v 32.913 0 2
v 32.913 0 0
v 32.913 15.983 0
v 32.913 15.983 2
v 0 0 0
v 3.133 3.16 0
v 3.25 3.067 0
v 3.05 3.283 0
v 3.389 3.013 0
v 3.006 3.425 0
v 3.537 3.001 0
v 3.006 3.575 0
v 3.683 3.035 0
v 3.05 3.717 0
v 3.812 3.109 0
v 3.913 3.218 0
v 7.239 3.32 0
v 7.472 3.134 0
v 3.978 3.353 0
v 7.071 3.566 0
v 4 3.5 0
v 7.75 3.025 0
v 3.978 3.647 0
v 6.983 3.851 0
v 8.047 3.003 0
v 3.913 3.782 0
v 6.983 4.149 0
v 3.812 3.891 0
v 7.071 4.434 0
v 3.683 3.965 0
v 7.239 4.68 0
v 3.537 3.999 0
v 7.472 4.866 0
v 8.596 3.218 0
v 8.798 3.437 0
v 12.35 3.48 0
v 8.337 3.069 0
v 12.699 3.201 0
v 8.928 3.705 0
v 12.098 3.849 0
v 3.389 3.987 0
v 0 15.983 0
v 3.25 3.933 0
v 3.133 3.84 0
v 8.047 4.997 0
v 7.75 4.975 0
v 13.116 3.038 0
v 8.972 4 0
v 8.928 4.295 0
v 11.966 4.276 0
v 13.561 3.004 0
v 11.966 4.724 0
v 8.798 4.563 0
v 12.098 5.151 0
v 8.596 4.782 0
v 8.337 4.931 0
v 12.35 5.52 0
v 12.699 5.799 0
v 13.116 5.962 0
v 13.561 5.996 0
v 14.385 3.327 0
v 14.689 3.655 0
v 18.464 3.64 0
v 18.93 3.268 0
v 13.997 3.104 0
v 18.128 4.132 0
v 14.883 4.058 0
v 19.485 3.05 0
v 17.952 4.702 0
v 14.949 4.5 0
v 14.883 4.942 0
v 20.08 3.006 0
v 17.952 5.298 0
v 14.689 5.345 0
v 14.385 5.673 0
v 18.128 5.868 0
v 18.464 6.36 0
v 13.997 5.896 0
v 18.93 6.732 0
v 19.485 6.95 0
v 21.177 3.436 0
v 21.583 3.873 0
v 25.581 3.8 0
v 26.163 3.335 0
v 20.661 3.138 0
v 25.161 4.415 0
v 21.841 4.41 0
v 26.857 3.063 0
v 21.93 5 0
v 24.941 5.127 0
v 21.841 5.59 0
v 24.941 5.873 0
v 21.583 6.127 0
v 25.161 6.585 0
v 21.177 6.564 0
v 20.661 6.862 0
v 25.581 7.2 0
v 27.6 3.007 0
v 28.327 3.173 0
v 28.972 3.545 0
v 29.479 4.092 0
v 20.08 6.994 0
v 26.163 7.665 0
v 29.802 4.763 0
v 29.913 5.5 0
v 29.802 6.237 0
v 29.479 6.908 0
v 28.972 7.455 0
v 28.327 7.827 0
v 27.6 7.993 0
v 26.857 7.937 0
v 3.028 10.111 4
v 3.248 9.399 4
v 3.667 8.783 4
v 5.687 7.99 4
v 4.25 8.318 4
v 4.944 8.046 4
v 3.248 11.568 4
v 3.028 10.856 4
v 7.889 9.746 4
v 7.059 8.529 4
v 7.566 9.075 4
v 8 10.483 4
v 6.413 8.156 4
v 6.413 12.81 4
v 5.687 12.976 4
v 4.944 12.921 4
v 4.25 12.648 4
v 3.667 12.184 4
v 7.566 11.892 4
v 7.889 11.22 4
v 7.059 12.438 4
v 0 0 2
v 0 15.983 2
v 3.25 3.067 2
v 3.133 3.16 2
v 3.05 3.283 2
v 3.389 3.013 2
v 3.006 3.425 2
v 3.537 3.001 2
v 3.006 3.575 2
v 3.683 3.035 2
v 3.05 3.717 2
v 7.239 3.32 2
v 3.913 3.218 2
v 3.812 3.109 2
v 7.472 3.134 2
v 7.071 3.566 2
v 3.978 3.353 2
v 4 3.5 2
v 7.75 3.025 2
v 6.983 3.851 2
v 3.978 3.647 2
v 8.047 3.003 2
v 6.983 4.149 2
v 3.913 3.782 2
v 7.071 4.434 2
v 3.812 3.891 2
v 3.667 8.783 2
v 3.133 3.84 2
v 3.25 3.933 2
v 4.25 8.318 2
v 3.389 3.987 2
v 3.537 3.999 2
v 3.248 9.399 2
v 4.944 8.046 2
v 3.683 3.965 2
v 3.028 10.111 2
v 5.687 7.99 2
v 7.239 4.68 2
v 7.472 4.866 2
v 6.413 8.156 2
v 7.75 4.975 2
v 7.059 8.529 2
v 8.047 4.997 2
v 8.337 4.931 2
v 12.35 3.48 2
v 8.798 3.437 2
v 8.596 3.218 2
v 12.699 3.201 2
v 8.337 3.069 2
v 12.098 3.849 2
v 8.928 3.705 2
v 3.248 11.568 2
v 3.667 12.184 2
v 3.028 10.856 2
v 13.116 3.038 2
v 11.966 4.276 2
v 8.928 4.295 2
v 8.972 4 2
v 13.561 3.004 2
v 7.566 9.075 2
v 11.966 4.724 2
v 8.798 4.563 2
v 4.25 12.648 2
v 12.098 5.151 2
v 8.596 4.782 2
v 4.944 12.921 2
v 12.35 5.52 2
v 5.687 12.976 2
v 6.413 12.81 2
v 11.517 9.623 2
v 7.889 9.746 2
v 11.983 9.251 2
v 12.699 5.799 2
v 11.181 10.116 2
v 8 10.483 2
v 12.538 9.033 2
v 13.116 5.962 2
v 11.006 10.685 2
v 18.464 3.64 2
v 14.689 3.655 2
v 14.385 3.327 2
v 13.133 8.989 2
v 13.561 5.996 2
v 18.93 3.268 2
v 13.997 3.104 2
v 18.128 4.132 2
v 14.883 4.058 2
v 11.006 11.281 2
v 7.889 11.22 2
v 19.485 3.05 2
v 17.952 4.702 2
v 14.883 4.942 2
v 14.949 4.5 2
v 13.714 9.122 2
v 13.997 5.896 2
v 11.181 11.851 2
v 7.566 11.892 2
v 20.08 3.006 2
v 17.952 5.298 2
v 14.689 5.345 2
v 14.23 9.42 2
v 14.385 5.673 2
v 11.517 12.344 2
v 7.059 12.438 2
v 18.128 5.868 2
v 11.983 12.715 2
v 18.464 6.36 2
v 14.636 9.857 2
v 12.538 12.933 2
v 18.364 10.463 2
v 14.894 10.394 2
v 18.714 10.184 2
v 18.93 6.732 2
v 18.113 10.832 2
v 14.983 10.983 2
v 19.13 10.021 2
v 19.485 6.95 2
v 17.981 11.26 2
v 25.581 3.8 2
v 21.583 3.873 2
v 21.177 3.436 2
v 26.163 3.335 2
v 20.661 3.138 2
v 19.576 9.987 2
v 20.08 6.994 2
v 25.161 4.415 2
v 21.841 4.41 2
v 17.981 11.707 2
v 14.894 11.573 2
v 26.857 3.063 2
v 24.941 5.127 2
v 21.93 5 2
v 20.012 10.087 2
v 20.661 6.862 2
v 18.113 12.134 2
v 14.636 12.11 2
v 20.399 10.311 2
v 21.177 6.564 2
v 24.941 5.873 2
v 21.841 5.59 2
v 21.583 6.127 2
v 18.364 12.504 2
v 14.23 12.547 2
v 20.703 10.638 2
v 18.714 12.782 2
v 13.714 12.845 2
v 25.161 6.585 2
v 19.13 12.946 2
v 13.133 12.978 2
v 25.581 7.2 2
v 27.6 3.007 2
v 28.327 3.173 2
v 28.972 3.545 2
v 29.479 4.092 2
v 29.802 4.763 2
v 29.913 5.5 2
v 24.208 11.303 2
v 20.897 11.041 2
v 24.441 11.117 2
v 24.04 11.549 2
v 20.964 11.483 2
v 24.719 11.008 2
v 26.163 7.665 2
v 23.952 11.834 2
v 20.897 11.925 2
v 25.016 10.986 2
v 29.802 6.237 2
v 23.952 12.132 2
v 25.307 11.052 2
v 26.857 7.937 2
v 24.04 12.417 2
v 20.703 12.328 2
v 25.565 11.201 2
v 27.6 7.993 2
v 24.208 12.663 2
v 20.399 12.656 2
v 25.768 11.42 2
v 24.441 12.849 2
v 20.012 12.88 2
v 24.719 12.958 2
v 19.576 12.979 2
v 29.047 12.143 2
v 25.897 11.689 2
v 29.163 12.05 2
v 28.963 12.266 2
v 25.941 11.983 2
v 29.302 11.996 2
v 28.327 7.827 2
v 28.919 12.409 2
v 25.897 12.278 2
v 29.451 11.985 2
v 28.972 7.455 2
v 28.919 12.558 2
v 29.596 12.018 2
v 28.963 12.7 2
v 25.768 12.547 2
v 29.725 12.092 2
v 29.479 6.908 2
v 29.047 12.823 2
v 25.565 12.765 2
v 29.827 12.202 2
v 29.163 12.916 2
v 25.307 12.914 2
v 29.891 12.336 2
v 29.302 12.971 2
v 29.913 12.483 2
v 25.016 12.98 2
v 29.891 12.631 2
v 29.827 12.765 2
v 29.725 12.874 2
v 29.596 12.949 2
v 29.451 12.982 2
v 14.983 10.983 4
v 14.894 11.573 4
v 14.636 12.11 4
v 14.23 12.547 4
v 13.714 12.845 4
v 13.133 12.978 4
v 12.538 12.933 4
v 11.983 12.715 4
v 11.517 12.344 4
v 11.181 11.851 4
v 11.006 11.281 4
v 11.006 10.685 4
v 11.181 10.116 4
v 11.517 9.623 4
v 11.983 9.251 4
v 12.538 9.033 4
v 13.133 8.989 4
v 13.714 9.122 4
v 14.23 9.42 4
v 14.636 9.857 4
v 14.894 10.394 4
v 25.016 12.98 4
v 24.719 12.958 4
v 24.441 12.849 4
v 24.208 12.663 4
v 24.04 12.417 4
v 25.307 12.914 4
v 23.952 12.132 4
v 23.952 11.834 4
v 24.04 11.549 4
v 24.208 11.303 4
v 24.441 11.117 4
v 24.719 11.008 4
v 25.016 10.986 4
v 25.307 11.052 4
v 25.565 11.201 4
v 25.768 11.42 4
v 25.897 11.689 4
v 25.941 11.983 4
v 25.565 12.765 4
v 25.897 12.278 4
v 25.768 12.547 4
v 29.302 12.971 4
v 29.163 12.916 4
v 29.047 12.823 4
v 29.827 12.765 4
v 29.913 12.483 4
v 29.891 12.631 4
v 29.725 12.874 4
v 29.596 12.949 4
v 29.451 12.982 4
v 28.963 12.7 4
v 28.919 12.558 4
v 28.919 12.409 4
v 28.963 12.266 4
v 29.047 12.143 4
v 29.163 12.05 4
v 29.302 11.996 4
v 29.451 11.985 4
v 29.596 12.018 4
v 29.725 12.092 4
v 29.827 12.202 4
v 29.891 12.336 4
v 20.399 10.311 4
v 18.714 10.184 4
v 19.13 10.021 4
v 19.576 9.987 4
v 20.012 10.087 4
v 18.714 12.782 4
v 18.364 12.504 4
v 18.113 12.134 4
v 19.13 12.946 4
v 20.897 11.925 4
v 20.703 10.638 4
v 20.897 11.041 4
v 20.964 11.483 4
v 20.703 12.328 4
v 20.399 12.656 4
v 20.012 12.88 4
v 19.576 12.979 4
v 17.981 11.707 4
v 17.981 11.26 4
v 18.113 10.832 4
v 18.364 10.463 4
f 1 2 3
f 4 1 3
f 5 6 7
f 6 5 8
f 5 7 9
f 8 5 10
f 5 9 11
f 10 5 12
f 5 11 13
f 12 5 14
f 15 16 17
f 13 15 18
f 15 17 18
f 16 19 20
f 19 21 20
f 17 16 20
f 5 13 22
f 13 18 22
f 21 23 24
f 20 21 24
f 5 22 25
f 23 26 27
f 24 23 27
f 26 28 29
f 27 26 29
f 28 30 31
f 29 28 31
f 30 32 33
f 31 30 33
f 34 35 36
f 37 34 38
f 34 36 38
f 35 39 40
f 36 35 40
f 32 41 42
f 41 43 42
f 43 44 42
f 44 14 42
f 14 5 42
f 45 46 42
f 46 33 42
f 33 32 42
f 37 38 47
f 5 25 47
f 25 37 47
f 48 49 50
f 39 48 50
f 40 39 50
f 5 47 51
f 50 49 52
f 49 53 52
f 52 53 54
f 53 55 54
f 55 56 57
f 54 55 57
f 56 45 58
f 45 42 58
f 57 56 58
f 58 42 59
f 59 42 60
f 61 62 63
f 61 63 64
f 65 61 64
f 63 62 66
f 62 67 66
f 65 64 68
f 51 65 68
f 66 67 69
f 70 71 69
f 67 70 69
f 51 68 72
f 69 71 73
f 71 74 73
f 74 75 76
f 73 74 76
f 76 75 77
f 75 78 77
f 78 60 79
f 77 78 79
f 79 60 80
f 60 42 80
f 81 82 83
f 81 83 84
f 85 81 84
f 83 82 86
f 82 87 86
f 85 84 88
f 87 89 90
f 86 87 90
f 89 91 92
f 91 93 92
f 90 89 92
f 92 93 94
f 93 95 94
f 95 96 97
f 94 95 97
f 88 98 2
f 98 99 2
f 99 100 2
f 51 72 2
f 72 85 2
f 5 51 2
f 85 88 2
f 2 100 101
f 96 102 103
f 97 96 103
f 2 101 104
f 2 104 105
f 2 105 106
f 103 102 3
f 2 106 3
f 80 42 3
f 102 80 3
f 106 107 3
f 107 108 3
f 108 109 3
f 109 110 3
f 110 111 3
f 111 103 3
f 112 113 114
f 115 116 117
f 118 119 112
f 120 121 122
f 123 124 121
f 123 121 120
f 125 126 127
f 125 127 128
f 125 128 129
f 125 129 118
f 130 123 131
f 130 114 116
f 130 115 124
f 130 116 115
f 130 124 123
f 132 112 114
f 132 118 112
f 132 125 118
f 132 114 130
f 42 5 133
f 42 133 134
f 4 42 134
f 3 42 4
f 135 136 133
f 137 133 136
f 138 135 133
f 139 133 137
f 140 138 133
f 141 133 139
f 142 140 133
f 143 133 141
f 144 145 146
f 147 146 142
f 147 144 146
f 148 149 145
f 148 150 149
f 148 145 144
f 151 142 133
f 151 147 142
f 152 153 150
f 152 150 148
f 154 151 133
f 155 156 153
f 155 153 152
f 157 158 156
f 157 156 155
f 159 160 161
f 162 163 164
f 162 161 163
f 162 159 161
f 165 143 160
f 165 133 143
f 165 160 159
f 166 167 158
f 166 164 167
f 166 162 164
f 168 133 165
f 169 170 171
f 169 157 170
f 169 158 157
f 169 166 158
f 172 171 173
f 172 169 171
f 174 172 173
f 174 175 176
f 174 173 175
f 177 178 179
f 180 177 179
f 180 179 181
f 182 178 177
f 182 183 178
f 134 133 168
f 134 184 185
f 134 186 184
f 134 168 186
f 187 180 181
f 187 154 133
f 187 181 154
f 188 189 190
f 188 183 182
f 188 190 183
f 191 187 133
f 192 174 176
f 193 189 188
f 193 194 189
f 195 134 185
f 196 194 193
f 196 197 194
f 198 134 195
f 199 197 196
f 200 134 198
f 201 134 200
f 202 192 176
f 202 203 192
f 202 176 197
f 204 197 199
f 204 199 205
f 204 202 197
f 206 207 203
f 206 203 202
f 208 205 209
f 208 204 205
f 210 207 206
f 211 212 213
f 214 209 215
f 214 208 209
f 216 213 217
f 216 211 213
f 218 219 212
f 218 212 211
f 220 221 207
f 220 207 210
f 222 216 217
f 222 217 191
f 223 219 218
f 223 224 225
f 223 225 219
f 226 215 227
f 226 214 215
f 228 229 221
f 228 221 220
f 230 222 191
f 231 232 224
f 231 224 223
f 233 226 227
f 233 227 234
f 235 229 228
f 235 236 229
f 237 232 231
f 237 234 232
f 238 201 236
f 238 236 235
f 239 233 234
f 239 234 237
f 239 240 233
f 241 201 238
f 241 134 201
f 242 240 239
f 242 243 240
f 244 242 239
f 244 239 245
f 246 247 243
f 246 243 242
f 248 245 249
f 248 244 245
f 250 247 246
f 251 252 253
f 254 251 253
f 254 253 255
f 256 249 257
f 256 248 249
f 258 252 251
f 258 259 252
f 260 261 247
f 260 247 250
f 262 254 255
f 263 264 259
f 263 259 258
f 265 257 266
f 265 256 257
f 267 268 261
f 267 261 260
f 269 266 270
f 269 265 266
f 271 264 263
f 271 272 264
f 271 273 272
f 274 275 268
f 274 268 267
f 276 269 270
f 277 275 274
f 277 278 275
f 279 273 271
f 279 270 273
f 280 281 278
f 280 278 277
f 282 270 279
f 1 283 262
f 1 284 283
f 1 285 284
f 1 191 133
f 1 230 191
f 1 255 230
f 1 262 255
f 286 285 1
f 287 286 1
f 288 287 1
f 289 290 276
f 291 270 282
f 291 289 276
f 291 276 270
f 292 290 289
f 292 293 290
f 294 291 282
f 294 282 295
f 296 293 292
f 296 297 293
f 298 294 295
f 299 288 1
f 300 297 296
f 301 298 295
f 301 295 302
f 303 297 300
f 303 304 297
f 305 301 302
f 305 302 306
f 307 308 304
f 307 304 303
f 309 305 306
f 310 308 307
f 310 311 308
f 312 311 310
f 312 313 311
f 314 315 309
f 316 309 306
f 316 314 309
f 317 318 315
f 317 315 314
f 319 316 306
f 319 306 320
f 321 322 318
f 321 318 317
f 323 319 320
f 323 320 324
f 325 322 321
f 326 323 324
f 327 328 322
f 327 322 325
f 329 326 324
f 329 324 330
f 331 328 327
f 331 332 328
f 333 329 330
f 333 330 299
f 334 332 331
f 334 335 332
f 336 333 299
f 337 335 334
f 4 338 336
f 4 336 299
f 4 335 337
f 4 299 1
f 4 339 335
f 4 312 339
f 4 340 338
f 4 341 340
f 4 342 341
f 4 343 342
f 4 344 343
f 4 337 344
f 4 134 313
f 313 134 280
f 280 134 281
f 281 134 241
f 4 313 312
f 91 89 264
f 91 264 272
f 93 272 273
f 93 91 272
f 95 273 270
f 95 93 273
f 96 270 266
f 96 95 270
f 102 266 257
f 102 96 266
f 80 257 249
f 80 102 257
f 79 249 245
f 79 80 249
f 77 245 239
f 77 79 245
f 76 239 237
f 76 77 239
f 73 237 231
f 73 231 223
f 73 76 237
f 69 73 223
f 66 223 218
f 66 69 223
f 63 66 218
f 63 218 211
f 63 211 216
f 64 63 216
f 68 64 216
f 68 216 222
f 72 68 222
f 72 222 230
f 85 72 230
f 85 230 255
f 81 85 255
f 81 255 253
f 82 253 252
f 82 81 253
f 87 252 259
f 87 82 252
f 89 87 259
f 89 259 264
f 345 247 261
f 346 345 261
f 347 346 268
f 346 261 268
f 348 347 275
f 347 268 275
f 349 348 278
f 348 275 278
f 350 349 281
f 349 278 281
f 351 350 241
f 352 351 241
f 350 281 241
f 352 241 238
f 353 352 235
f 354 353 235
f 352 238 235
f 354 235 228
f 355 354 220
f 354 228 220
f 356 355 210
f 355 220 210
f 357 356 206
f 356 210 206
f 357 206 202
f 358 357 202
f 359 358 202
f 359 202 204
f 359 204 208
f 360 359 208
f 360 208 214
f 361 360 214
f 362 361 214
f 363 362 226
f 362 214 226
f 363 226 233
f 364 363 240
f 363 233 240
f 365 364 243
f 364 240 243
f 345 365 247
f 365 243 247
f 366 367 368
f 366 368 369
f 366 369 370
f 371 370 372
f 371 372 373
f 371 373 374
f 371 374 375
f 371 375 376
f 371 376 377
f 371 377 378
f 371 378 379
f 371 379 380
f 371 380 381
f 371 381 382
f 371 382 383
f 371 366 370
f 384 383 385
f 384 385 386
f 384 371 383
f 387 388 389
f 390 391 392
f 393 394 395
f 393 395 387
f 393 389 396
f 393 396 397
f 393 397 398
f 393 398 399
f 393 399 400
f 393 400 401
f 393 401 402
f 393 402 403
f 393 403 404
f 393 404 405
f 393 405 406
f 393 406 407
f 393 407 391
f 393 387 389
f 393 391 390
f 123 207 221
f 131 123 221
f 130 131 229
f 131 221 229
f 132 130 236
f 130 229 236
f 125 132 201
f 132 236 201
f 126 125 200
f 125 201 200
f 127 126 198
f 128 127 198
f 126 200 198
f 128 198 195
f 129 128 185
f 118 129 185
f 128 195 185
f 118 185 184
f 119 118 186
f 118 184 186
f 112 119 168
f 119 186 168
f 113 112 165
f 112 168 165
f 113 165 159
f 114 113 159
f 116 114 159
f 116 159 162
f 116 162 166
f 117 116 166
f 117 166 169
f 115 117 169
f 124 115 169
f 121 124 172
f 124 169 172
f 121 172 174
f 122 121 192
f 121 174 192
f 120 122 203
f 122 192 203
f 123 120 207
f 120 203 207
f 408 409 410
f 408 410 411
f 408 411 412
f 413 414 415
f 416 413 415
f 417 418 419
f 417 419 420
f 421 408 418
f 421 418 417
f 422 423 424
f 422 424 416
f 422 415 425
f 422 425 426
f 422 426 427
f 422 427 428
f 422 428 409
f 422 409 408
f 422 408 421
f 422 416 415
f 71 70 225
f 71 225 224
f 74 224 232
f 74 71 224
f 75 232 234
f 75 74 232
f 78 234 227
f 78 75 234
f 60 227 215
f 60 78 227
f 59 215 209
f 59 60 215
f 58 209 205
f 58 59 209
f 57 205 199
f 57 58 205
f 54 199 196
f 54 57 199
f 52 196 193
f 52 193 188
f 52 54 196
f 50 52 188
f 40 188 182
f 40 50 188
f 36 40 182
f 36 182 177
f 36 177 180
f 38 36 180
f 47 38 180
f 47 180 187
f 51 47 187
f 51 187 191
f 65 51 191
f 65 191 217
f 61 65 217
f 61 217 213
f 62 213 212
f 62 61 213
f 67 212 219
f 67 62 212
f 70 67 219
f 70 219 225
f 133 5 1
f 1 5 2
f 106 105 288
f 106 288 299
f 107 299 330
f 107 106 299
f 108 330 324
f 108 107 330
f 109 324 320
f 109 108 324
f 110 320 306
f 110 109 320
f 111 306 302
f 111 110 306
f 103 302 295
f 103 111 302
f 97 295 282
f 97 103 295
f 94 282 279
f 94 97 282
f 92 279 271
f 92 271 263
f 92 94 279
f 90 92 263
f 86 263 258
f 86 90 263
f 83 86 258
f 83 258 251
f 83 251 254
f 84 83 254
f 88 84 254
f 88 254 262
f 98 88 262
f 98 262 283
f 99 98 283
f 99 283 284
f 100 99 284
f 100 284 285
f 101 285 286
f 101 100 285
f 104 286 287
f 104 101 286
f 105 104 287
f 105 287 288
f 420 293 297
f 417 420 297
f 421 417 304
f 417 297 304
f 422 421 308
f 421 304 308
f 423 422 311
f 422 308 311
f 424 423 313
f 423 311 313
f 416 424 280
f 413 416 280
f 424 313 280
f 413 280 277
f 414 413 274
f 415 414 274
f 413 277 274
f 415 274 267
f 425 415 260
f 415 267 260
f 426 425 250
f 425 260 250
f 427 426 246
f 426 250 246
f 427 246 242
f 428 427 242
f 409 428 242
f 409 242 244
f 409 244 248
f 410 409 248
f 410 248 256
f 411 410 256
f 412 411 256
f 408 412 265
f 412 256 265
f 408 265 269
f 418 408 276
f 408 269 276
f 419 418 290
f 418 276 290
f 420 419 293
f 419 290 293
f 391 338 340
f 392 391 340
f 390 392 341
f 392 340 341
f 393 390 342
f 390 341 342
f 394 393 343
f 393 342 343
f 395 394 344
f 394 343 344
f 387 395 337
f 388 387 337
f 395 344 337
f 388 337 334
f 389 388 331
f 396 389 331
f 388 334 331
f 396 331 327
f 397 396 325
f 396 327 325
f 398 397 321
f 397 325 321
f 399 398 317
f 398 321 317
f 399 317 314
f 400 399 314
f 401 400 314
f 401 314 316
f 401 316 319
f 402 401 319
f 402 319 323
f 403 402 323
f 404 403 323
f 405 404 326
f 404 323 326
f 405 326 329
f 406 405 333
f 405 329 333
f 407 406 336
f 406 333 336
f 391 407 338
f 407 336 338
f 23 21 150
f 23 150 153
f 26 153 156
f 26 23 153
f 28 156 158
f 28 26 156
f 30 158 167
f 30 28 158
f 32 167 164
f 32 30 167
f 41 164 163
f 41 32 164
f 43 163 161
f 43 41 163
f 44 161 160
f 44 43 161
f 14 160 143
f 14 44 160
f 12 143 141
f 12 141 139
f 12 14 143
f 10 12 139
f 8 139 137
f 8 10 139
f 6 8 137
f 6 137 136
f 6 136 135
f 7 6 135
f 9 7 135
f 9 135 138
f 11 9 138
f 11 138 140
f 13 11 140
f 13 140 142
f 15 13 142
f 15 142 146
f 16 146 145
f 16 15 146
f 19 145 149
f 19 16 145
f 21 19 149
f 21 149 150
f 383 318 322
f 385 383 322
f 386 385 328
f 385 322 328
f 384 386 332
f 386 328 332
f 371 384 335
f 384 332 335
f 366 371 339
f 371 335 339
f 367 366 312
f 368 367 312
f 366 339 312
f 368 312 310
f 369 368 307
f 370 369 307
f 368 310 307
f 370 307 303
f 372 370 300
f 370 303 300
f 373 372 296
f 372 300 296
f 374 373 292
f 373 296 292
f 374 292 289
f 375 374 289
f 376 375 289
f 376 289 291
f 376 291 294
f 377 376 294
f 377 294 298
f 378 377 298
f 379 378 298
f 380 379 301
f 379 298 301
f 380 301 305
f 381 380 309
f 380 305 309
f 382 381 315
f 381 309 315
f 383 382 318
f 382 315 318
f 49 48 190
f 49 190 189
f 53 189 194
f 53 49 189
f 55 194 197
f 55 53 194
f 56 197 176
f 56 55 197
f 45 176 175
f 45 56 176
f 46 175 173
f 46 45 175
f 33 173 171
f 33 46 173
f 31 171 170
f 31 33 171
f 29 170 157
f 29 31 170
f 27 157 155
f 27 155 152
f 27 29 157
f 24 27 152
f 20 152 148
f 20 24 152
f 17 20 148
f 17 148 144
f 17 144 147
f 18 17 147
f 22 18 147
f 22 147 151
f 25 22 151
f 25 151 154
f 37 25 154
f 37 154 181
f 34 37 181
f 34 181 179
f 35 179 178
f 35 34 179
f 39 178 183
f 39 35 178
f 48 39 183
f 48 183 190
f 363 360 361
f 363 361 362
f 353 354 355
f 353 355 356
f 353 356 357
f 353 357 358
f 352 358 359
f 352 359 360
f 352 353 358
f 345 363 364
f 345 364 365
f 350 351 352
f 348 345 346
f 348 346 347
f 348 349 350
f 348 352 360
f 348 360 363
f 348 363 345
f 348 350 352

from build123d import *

# Parameters (mm, degrees)
F0_W     = 32.913417
F0_H     = 15.983271
F0_R     = 0.5
F0_R_2   = 1
F0_R_3   = 1.5
F0_R_4   = 2
F0_R_5   = 2.5
F1_DEPTH = 2
F2_R     = 0.5
F2_R_2   = 1
F2_R_3   = 1.5
F2_R_4   = 2
F2_R_5   = 2.5
F3_DEPTH = 2


with BuildPart() as f1:
    # F0 (on Top) → F1 (new body)
    with BuildSketch(Plane.XY):
        with Locations((16.456708, 7.991635)):
            Rectangle(F0_W, F0_H)
        with Locations((3.5, 3.5)):
            Circle(F0_R, mode=Mode.SUBTRACT)
        with Locations((7.972136, 4)):
            Circle(F0_R_2, mode=Mode.SUBTRACT)
        with Locations((13.449362, 4.5)):
            Circle(F0_R_3, mode=Mode.SUBTRACT)
        with Locations((19.930102, 5)):
            Circle(F0_R_4, mode=Mode.SUBTRACT)
        with Locations((27.413417, 5.5)):
            Circle(F0_R_5, mode=Mode.SUBTRACT)
        with Locations((5.5, 10.483271)):
            Circle(F0_R_5, mode=Mode.SUBTRACT)
        with Locations((12.983315, 10.983271)):
            Circle(F0_R_4, mode=Mode.SUBTRACT)
        with Locations((19.464055, 11.483271)):
            Circle(F0_R_3, mode=Mode.SUBTRACT)
        with Locations((24.941281, 11.983271)):
            Circle(F0_R_2, mode=Mode.SUBTRACT)
        with Locations((29.413417, 12.483271)):
            Circle(F0_R, mode=Mode.SUBTRACT)
        with Locations((5.5, 10.483271)):
            Circle(F0_R_5)
        with Locations((12.983315, 10.983271)):
            Circle(F0_R_4)
        with Locations((19.464055, 11.483271)):
            Circle(F0_R_3)
        with Locations((24.941281, 11.983271)):
            Circle(F0_R_2)
        with Locations((29.413417, 12.483271)):
            Circle(F0_R)
    extrude(amount=F1_DEPTH)

    # F2 (on face) → F3 (join)
    with BuildSketch(Plane.XY.offset(2)):
        with Locations((29.413417, 12.483271)):
            Circle(F2_R)
        with Locations((24.941281, 11.983271)):
            Circle(F2_R_2)
        with Locations((19.464055, 11.483271)):
            Circle(F2_R_3)
        with Locations((12.983315, 10.983271)):
            Circle(F2_R_4)
        with Locations((5.5, 10.483271)):
            Circle(F2_R_5)
    extrude(amount=F3_DEPTH)


solid = f1.part
